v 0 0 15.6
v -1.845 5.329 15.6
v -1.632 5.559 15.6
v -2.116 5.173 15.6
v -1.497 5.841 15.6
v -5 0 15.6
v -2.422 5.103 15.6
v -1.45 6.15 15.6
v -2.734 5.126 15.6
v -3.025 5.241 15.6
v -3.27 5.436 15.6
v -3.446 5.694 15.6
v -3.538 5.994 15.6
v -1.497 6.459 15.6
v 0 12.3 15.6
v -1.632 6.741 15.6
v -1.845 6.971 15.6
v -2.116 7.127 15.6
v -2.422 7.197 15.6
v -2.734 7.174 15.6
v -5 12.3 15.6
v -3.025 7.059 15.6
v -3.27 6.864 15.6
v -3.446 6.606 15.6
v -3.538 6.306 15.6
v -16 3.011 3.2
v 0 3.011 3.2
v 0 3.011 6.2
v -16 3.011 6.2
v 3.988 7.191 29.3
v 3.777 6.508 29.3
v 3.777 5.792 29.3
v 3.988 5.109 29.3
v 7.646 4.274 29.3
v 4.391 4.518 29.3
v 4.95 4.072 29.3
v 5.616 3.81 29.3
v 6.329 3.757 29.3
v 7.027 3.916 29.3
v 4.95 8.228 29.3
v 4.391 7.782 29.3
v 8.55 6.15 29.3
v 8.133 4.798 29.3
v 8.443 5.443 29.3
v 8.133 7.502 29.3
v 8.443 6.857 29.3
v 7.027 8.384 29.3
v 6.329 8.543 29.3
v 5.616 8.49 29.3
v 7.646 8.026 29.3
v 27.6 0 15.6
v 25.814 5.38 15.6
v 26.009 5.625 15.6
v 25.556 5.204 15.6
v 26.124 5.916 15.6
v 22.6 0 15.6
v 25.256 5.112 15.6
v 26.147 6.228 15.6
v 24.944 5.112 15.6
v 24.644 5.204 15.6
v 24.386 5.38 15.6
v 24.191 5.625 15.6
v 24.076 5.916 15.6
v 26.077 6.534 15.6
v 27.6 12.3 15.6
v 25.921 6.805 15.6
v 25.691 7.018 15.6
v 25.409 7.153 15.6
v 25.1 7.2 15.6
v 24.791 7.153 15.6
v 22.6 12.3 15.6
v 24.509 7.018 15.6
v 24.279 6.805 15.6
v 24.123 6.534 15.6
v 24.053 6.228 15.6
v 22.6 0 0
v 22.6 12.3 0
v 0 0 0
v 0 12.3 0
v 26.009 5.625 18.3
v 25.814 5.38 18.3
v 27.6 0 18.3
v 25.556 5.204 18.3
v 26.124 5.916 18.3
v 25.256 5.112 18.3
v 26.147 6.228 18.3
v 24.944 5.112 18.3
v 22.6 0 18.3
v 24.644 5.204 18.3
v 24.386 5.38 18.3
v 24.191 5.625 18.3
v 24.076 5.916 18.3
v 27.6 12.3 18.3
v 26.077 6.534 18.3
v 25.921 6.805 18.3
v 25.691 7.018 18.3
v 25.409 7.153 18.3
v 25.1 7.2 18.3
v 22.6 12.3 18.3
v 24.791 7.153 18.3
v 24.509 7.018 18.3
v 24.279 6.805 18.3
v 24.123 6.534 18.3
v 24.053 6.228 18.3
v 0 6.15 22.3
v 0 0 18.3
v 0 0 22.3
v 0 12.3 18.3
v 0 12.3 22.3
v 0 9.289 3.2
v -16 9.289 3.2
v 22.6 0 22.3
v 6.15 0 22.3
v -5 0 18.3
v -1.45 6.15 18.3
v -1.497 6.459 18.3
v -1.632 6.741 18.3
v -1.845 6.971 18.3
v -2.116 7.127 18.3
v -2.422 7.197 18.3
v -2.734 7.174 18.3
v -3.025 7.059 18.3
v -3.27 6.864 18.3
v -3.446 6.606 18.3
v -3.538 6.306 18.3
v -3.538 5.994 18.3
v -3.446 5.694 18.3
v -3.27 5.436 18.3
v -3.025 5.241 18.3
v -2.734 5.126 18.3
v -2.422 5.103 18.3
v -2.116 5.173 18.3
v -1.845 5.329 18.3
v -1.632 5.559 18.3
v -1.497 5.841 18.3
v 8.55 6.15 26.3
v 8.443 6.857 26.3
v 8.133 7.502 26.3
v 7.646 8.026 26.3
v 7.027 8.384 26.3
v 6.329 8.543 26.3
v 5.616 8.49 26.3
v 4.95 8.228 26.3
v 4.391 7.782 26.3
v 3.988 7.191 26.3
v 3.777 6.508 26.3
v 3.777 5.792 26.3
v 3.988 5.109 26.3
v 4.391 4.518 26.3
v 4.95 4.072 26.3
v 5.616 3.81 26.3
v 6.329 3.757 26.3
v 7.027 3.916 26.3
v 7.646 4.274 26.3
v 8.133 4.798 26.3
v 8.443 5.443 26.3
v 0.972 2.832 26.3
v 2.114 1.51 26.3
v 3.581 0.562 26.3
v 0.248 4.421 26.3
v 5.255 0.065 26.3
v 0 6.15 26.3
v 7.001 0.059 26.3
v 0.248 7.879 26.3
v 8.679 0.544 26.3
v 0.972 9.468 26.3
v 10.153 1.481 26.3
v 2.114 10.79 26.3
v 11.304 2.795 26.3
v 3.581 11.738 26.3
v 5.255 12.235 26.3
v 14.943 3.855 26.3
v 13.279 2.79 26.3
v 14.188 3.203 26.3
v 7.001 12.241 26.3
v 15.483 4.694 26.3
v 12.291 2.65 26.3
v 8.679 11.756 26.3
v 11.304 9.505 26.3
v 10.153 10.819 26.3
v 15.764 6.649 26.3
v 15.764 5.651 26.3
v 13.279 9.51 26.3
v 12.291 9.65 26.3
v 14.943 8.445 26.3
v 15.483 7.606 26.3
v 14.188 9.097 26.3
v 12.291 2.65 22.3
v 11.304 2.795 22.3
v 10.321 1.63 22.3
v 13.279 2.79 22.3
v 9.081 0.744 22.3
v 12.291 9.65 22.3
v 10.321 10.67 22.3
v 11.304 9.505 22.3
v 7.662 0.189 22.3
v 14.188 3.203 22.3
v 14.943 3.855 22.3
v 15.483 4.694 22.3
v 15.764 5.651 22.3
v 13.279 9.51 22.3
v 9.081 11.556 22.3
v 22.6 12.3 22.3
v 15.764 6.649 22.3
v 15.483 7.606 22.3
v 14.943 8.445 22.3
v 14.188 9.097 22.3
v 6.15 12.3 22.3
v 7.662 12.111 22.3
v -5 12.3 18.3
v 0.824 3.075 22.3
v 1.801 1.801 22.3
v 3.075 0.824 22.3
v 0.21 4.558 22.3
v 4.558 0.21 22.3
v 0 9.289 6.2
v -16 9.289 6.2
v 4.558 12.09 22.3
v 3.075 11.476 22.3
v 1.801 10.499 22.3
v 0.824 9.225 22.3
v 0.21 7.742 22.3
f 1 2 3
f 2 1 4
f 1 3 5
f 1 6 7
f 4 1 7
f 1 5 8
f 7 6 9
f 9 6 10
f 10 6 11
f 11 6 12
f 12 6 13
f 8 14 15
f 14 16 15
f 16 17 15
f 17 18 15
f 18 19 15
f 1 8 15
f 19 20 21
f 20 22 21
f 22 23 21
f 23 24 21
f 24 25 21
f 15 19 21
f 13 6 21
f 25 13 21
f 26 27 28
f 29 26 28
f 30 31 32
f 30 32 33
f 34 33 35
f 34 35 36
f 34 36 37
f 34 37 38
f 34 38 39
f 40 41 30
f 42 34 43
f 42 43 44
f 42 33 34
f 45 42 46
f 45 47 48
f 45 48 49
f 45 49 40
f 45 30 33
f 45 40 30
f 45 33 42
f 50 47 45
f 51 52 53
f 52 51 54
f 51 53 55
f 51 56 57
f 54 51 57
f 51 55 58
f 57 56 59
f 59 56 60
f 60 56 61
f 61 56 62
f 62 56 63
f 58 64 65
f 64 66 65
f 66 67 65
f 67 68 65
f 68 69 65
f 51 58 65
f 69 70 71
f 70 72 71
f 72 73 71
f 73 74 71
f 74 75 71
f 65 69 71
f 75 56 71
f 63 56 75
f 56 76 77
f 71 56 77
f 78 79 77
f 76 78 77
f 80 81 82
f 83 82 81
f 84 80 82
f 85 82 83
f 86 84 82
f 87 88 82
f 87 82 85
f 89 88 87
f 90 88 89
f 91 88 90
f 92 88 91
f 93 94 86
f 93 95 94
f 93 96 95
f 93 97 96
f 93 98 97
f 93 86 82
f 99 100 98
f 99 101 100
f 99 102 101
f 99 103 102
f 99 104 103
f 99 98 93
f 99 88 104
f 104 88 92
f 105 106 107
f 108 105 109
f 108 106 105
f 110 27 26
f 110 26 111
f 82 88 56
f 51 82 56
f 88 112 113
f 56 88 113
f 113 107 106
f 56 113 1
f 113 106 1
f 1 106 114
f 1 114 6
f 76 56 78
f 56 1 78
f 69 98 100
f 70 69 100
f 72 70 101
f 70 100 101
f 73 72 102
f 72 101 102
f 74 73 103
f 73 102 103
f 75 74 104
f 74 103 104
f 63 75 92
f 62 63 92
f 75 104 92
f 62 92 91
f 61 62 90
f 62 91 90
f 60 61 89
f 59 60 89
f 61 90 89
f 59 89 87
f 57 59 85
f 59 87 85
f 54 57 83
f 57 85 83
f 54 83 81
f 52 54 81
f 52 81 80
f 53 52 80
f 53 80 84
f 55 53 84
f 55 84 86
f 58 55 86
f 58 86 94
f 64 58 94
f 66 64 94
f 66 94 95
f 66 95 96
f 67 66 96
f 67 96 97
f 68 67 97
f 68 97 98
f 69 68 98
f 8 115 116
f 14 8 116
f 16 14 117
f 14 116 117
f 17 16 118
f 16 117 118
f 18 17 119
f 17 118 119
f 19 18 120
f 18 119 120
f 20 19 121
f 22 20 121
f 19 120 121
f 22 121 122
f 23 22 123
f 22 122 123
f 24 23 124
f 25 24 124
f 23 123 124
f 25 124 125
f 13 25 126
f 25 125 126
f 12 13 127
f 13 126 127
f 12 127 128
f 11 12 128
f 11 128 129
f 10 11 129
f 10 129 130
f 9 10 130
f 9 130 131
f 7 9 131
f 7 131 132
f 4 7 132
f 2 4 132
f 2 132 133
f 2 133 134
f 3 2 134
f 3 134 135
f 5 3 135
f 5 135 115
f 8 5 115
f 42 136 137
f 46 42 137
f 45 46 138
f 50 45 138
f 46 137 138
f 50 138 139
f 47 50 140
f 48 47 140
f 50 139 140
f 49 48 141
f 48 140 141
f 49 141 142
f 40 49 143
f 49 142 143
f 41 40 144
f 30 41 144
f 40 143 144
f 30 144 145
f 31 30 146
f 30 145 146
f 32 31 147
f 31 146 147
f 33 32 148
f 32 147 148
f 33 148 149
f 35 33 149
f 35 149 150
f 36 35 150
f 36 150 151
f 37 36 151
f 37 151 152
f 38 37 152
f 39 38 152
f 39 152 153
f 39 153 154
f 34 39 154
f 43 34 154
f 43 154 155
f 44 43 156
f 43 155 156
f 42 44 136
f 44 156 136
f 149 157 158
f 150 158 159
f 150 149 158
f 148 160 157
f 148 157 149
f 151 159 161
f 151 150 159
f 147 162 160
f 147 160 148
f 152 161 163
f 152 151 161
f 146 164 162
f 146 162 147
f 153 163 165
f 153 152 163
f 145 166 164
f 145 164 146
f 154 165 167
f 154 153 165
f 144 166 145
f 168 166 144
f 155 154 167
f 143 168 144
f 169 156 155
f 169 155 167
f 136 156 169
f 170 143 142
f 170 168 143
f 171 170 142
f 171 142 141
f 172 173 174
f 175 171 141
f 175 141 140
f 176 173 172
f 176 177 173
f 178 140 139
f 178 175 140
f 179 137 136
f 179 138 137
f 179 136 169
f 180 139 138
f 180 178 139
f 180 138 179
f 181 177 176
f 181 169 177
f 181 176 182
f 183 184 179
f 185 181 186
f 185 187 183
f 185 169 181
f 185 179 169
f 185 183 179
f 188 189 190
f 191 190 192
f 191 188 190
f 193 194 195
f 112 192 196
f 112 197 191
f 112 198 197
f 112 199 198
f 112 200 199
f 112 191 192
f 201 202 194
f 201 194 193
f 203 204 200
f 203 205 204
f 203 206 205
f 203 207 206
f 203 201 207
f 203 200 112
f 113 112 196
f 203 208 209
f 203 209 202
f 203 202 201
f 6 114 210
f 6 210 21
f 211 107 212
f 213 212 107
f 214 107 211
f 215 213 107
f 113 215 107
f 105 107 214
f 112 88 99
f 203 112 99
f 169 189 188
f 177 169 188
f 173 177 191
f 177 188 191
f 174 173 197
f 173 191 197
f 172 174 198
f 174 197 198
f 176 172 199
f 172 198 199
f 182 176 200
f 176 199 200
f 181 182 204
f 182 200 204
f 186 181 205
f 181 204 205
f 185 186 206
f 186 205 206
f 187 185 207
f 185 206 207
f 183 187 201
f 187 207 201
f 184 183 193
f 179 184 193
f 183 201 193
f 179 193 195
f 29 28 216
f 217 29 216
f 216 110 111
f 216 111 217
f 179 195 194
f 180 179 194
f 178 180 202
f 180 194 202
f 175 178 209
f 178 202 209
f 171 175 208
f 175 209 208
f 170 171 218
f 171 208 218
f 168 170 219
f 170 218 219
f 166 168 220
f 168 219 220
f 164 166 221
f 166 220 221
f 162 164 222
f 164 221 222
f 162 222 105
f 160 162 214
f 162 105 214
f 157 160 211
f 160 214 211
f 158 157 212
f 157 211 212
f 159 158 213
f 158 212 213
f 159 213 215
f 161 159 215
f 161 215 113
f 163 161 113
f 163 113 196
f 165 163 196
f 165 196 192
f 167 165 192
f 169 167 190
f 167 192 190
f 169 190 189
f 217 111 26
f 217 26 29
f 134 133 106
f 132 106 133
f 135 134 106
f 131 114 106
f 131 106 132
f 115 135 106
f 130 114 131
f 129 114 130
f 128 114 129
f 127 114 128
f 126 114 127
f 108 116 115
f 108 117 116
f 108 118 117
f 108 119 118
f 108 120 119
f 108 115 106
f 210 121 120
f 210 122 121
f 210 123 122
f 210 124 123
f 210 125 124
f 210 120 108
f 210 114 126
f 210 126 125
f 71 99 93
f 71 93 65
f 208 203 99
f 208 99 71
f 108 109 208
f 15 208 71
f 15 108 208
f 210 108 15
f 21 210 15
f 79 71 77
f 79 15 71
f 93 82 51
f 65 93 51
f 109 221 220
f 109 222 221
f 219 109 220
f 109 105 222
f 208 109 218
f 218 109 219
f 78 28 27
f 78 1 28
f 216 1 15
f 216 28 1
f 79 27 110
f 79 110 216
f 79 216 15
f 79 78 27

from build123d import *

# Parameters (mm, degrees)
ESQUISSE1_W             = 22.6
ESQUISSE1_H             = 12.3
BOSS_EXTRU_1_DEPTH      = 22.3
BOSS_EXTRU_2_DEPTH      = 5
BOSS_EXTRU_2_DEPTH_BACK = 27.6
ESQUISSE2_W             = 2.7
ESQUISSE2_H             = 12.3
ESQUISSE3_R             = 1.05
ENL_V_MAT_EXTRU_1_DEPTH = 5
BOSS_EXTRU_3_DEPTH      = 4
ESQUISSE5_R             = 2.4
BOSS_EXTRU_4_DEPTH      = 3
ESQUISSE6_W             = 3
ESQUISSE6_H             = 6.277768914
BOSS_EXTRU_5_DEPTH      = 16


with BuildPart() as part:
    # Esquisse1 → Boss.-Extru.1 (new body)
    with BuildSketch(Plane.XY):
        with Locations((11.3, 6.15)):
            Rectangle(ESQUISSE1_W, ESQUISSE1_H)
    extrude(amount=BOSS_EXTRU_1_DEPTH)

    # Esquisse2 → Boss.-Extru.2 (add, two sides: drawn at the far end of the back side and taken through both)
    with BuildSketch(Plane(origin=(22.6, 0, 0), x_dir=(0, 0, -1), z_dir=(1, 0, 0)).offset(-BOSS_EXTRU_2_DEPTH_BACK)):
        with Locations((-16.95, 6.15)):
            Rectangle(ESQUISSE2_W, ESQUISSE2_H)
    extrude(amount=BOSS_EXTRU_2_DEPTH + BOSS_EXTRU_2_DEPTH_BACK)

    # Esquisse3 → Enlèv. mat.-Extru.1 (cut)
    with BuildSketch(Plane.XY.offset(18.3)):
        with Locations((-2.5, 6.15)):
            Circle(ESQUISSE3_R)
        with Locations(Location((25.1, 6.15, 0), (0, 0, 90))):
            Circle(ESQUISSE3_R)
    extrude(amount=-ENL_V_MAT_EXTRU_1_DEPTH, mode=Mode.SUBTRACT)

    # Esquisse4 → Boss.-Extru.3 (add)
    with BuildSketch(Plane.XY.offset(22.3)):
        with BuildLine():
            ThreePointArc((11.304065041, 9.505311246), (0, 6.15), (11.304065041, 2.794688754))
            ThreePointArc((11.304065041, 2.794688754), (15.8, 6.15), (11.304065041, 9.505311246))
        make_face()
    extrude(amount=BOSS_EXTRU_3_DEPTH)

    # Esquisse5 → Boss.-Extru.4 (add)
    with BuildSketch(Plane.XY.offset(26.3)):
        with Locations((6.15, 6.15)):
            Circle(ESQUISSE5_R)
    extrude(amount=BOSS_EXTRU_4_DEPTH)

    # Esquisse6 → Boss.-Extru.5 (add)
    with BuildSketch(Plane.ZY):
        with Locations((4.7, 6.15)):
            Rectangle(ESQUISSE6_W, ESQUISSE6_H)
    extrude(amount=BOSS_EXTRU_5_DEPTH)


solid = part.part
